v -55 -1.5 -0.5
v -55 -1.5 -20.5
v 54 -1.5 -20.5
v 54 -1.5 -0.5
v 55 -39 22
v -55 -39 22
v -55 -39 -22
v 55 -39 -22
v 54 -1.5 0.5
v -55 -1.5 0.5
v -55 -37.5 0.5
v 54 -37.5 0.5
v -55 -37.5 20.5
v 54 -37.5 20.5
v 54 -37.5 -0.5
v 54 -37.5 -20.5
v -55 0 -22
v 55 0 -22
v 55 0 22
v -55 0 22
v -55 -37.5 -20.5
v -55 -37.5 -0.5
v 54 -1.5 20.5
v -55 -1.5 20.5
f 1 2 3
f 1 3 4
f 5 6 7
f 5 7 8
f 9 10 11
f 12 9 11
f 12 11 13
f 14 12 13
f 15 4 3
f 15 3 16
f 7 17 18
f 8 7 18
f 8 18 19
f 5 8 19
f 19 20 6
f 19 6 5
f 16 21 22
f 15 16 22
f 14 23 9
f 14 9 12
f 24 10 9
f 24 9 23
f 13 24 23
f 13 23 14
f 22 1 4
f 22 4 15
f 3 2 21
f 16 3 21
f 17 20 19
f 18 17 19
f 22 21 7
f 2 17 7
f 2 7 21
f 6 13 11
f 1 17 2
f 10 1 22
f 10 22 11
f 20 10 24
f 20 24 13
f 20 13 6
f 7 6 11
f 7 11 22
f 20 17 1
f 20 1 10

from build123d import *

# Parameters (mm, degrees)
F0_W     = 110
F0_H     = 44
F1_DEPTH = 39
F2_W     = 36
F2_H     = 20
F3_DEPTH = 109


with BuildPart() as f1:
    # F0 (on Front) → F1 (new body)
    with BuildSketch(Plane.XZ):
        Rectangle(F0_W, F0_H)
    extrude(amount=F1_DEPTH)

    # F2 (on face) → F3 (cut)
    with BuildSketch(Plane(origin=(-55, 0, 0), x_dir=(0, -1, 0), z_dir=(-1, 0, 0))):
        with Locations((19.5, 10.5)):
            Rectangle(F2_W, F2_H)
        with Locations((19.5, -10.5)):
            Rectangle(F2_W, F2_H)
    extrude(amount=-F3_DEPTH, mode=Mode.SUBTRACT)


solid = f1.part
